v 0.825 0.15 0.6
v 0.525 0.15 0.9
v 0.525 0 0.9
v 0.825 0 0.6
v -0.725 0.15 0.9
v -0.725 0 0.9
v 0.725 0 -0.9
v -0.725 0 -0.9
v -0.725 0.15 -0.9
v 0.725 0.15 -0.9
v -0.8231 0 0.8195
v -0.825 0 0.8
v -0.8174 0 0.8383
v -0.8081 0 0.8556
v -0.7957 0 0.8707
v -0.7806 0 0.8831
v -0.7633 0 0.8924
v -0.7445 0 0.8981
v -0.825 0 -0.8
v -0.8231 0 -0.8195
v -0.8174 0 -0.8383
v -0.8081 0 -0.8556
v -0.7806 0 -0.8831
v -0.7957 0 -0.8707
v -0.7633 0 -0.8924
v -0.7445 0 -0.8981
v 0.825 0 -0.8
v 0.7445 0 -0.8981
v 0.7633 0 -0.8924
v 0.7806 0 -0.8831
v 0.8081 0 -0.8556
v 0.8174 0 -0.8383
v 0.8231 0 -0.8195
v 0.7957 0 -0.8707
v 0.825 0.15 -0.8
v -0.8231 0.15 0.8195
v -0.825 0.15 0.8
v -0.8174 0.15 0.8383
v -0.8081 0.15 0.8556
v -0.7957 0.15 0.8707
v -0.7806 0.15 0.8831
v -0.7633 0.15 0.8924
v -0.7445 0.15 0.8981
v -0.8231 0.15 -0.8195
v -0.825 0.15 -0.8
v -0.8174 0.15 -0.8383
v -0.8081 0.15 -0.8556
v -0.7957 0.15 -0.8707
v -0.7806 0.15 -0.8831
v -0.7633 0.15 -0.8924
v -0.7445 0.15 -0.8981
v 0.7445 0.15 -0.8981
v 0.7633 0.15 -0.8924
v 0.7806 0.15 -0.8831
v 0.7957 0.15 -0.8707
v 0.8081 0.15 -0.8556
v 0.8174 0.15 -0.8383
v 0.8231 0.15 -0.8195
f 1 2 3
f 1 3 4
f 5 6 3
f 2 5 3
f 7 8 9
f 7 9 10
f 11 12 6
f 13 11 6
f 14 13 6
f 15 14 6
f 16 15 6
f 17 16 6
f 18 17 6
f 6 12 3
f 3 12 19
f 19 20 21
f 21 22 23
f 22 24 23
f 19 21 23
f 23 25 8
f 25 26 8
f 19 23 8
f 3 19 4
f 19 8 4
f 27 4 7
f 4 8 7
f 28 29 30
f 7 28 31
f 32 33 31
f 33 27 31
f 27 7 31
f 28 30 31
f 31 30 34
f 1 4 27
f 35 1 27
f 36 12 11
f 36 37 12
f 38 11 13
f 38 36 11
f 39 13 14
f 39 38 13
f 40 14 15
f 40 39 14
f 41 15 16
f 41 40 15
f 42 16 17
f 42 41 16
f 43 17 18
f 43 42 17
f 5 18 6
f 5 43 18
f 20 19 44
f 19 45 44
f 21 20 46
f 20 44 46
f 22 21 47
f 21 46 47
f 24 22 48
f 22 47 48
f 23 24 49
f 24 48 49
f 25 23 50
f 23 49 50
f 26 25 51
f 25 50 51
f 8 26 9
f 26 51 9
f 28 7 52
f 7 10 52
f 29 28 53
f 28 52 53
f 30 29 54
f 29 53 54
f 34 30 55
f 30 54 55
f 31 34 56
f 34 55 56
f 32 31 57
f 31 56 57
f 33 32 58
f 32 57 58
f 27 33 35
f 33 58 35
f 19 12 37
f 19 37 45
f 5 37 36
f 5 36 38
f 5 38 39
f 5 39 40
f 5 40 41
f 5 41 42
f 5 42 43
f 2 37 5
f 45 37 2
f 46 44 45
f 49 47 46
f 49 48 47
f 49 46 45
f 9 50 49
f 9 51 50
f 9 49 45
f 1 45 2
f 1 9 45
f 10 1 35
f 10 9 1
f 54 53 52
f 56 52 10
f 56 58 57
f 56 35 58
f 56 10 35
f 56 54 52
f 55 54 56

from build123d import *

# Parameters (mm, degrees)
SKETCH1_W           = 1.65
SKETCH1_H           = 1.8
BOSS_EXTRUDE1_DEPTH = 0.15
CUT_EXTRUDE1_DEPTH  = 1.15
FILLET1_R           = 0.1


with BuildPart() as part:
    # Sketch1 → Boss-Extrude1 (new body)
    with BuildSketch(Plane(origin=(0, 0, 0), x_dir=(1, 0, 0), z_dir=(0, 1, 0))):
        Rectangle(SKETCH1_W, SKETCH1_H)
    extrude(amount=BOSS_EXTRUDE1_DEPTH)

    # Sketch2 → Cut-Extrude1 (cut, through all)
    with BuildSketch(Plane(origin=(0, 0.15, 0), x_dir=(1, 0, 0), z_dir=(0, 1, 0))):
        Polygon((0.525, -0.9), (0.825, -0.6), (0.825, -0.9), align=None)
    extrude(amount=-CUT_EXTRUDE1_DEPTH, mode=Mode.SUBTRACT)

    # Fillet1
    fillet1_edges = [part.edges().sort_by_distance(p)[0] for p in [
        (-0.825, 0.075, 0.9),
        (-0.825, 0.075, -0.9),
        (0.825, 0.075, -0.9),
    ]]
    fillet(fillet1_edges, radius=FILLET1_R)


solid = part.part
